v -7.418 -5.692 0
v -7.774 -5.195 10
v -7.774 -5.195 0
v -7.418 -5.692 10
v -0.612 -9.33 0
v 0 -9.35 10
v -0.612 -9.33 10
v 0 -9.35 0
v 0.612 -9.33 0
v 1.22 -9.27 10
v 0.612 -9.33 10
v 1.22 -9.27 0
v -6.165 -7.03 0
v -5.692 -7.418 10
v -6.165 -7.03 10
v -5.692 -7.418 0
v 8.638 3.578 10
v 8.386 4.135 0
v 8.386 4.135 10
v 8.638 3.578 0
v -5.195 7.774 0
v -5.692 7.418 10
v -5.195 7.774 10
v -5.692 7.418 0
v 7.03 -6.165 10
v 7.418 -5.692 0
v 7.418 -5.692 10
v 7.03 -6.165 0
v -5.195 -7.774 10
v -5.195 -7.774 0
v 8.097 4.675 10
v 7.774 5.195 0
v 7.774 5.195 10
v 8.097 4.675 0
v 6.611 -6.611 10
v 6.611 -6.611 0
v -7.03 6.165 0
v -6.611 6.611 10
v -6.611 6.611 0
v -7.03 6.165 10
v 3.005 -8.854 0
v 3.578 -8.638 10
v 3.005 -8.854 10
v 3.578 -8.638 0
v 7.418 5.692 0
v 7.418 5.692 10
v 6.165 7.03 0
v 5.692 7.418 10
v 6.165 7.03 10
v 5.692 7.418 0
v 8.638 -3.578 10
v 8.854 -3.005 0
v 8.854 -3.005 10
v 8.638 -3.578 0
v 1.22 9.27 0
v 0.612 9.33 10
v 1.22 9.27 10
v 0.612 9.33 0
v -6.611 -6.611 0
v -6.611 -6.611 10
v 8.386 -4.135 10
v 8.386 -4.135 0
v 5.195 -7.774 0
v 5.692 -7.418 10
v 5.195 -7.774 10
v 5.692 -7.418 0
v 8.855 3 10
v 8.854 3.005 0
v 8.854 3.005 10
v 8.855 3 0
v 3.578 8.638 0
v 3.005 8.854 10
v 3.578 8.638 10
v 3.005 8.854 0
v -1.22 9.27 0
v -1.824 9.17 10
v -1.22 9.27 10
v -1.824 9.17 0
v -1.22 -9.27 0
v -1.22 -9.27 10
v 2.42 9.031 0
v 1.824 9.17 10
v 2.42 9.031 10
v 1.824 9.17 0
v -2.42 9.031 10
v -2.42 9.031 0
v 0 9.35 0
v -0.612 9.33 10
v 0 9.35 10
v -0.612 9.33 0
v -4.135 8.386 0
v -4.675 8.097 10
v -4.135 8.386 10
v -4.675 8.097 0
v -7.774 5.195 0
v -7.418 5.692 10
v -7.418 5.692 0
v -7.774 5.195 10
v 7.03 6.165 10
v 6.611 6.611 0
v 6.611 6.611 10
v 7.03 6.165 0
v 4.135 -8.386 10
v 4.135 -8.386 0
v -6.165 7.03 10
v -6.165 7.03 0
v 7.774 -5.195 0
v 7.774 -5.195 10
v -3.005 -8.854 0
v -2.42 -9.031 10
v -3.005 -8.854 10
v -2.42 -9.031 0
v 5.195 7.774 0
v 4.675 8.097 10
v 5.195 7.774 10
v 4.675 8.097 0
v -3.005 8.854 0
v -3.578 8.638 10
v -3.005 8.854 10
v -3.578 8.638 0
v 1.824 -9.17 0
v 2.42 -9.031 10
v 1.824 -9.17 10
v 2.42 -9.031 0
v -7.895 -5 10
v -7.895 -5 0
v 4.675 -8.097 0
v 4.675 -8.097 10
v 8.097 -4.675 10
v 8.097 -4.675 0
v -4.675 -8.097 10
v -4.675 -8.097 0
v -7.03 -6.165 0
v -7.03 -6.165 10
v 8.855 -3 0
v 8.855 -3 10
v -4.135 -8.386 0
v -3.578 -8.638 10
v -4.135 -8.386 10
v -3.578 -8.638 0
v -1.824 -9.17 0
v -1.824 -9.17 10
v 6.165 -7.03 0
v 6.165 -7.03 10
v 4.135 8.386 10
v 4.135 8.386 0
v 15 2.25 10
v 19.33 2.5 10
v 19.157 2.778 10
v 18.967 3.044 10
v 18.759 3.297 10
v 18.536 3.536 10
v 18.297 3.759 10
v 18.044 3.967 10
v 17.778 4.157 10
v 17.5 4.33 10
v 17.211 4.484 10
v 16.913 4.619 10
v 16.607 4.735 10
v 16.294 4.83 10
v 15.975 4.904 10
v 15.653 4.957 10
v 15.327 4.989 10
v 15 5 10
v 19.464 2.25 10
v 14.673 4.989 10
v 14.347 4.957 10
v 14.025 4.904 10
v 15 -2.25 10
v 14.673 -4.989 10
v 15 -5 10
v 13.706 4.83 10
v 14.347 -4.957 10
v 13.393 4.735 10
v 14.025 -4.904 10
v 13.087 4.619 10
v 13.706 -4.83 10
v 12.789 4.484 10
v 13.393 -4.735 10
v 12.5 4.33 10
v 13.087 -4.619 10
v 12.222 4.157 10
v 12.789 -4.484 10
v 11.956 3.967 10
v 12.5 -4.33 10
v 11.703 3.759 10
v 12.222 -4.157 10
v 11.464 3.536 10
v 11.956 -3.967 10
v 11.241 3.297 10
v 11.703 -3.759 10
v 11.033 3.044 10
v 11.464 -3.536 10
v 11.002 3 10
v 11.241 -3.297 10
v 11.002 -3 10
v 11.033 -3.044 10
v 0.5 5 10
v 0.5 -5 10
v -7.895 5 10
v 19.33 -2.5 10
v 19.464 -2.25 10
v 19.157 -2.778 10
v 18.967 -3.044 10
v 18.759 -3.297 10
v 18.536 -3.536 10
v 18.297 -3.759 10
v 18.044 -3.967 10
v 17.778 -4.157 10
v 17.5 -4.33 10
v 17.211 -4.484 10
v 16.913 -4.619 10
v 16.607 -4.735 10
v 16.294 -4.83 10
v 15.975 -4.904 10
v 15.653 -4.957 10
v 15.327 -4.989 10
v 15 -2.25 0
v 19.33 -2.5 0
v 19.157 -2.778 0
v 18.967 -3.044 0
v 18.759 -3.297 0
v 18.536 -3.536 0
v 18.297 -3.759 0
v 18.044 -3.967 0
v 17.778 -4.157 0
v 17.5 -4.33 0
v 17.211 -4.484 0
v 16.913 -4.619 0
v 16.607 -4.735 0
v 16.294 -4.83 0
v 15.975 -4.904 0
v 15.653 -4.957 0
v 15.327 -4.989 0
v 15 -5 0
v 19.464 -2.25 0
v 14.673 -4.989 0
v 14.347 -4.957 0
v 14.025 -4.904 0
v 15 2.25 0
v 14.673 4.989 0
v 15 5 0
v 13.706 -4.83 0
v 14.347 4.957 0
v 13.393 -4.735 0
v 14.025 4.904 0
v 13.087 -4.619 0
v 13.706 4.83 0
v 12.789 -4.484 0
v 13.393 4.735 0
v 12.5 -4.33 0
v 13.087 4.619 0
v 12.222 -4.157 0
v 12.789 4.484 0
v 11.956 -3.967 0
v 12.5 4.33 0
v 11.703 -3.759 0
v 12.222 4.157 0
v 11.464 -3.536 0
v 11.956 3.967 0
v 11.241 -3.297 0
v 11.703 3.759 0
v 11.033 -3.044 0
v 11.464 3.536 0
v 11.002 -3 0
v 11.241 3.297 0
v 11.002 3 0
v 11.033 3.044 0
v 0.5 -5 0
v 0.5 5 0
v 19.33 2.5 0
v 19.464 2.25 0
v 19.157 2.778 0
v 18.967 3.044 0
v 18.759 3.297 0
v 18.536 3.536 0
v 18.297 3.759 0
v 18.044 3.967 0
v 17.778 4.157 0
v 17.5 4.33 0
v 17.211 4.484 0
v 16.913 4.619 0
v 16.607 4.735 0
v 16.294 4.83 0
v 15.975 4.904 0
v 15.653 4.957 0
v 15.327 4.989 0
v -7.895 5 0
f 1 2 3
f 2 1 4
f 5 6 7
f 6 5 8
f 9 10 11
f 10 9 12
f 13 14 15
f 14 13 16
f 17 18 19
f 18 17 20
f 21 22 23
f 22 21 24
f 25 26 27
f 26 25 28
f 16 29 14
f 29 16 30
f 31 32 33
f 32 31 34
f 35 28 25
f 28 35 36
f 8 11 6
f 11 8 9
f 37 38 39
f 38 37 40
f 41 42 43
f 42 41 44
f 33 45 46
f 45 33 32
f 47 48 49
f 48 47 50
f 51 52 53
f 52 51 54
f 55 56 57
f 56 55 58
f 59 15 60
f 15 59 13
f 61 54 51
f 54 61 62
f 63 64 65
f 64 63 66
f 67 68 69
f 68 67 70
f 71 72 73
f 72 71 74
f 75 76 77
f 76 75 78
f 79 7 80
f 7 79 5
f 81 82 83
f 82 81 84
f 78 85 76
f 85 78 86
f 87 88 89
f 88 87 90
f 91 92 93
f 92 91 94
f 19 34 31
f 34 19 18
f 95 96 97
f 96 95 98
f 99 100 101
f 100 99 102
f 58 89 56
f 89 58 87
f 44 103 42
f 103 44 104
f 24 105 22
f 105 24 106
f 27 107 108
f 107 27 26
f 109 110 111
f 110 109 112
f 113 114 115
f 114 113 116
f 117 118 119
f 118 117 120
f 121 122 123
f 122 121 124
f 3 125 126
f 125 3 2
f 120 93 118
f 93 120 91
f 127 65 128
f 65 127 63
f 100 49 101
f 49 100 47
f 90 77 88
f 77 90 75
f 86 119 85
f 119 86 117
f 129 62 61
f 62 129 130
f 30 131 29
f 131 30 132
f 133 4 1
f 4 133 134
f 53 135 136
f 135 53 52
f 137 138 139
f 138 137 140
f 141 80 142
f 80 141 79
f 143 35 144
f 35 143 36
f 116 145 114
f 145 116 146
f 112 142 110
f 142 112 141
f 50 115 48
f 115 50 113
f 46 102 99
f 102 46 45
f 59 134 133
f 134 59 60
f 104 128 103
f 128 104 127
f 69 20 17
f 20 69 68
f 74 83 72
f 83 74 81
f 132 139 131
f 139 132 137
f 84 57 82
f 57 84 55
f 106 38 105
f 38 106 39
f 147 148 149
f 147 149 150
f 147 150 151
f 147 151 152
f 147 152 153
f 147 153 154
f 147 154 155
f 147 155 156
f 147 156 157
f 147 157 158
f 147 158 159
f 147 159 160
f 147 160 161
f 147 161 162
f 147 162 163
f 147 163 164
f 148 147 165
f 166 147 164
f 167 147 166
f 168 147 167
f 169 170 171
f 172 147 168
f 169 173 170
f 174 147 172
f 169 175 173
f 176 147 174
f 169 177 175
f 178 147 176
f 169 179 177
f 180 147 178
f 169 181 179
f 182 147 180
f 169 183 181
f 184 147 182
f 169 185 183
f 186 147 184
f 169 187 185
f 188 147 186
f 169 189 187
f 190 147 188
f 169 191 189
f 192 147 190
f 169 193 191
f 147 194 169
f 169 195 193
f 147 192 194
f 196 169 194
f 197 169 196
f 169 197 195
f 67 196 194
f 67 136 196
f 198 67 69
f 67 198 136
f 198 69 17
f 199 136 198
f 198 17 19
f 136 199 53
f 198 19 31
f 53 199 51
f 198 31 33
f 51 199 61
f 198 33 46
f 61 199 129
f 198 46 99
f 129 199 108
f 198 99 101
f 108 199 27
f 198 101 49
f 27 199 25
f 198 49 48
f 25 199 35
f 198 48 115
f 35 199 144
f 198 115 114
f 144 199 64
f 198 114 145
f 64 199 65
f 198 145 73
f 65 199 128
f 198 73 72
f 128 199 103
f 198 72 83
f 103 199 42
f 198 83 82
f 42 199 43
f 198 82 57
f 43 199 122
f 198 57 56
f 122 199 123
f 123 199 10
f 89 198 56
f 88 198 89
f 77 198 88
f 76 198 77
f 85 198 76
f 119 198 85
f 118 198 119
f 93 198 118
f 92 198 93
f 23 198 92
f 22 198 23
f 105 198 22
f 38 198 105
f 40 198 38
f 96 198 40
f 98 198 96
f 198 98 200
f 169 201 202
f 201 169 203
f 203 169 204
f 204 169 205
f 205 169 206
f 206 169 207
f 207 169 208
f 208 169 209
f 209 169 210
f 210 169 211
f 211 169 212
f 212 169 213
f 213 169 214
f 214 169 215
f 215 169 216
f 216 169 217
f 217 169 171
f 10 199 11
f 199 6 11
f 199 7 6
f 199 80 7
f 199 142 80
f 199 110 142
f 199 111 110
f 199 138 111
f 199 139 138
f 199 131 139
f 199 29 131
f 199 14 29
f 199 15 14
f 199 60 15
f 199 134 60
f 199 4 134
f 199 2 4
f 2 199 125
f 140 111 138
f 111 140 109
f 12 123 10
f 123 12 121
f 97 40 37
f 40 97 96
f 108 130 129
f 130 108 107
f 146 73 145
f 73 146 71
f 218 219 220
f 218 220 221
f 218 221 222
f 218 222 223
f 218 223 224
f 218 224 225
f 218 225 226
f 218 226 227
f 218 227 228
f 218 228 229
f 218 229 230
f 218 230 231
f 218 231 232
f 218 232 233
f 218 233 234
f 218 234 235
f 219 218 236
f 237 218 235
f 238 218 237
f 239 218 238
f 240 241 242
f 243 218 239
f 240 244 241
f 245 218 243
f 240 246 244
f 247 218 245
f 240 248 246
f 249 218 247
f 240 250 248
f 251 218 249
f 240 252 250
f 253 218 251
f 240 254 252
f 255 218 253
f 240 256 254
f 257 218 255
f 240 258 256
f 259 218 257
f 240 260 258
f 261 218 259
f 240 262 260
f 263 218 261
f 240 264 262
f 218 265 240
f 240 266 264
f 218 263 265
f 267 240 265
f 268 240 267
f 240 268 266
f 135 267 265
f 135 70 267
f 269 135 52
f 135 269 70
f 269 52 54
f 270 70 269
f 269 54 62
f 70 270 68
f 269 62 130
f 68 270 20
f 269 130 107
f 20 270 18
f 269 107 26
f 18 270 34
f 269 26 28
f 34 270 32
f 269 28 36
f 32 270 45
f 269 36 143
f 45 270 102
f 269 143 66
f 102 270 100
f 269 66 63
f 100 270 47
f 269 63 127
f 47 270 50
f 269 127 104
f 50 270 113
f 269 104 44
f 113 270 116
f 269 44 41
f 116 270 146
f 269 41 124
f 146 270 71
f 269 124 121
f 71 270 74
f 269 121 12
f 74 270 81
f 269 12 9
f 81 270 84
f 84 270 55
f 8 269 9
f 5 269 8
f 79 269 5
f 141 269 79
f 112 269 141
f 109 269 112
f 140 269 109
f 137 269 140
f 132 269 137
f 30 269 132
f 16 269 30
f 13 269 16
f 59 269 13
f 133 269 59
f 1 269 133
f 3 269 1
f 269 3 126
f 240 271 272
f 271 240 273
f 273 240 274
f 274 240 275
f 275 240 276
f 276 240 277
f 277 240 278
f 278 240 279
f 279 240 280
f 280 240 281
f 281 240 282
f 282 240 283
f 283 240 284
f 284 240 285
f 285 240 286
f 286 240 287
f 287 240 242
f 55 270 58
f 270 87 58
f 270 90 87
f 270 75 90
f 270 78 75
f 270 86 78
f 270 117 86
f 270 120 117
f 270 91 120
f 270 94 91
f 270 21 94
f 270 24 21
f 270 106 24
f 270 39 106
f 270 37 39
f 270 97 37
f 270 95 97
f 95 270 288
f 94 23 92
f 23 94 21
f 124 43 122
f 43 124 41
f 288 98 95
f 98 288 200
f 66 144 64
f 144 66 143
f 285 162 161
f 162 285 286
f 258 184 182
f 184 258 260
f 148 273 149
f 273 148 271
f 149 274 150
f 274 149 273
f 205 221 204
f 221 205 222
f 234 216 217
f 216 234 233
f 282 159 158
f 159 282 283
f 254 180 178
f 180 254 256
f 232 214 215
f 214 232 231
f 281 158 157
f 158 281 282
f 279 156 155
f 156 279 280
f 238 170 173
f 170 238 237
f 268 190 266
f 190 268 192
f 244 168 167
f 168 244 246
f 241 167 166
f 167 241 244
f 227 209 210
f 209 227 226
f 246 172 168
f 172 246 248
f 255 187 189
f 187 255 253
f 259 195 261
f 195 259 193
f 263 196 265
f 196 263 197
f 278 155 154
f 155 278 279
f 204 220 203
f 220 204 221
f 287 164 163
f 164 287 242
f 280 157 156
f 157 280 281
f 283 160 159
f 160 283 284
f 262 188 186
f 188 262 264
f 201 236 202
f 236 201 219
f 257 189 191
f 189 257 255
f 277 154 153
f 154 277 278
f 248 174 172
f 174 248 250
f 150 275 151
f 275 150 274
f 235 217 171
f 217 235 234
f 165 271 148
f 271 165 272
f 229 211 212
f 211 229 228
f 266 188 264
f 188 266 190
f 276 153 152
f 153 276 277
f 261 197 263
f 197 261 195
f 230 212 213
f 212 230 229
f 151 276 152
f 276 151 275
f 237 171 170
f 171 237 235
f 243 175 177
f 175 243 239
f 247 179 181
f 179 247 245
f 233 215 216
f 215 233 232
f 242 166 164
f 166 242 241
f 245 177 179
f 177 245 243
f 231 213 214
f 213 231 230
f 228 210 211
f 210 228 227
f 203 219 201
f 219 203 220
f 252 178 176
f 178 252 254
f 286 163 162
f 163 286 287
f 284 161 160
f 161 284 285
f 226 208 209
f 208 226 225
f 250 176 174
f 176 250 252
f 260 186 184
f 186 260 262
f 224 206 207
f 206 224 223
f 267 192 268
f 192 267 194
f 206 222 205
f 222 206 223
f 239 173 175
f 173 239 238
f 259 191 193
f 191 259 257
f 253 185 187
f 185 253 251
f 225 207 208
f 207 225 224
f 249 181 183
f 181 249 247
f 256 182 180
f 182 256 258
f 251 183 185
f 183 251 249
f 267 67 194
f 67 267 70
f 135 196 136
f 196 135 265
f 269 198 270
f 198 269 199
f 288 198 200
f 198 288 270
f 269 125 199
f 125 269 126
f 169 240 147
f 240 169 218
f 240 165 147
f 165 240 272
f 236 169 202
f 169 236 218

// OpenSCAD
// Tubing clip for a 12.7 mm (1/2 inch) lab stand rod
// Print orientation: flat on the bed, extruded upward in +Z

// ---------------- Parameters ----------------
rod_d        = 12.7;   // stand rod diameter
ring_w       = 3;      // rod ring wall thickness
ring_od      = rod_d + 2 * ring_w;  // rod ring outer diameter (18.7 mm)
ring_id      = rod_d;  // rod ring inner diameter (12.7 mm)

tub_d        = 6;      // tubing ring inner diameter
tub_w        = 2;      // tubing ring wall thickness
tub_od       = tub_d + 2 * tub_w;   // tubing ring outer diameter (10 mm)
tub_x        = 15;     // tubing ring centre X position

bridge_x0    = 8;      // bridge start (X)
bridge_x1    = 12;     // bridge end (X)
bridge_w     = 6;      // bridge width (Y)

opening_rod  = 10;     // rod ring opening width (Y), on -X side
opening_tub  = 4.5;    // tubing ring opening width (Y), on +X side

height       = 10;     // extrusion height (Z)

eps          = 0.5;    // cutter overshoot past faces

$fn = 96;

// ---------------- Model ----------------
difference() {
    union() {
        // Rod ring
        cylinder(d = ring_od, h = height);

        // Tubing ring
        translate([tub_x, 0, 0])
            cylinder(d = tub_od, h = height);

        // Solid bridge between the rings
        translate([bridge_x0, -bridge_w / 2, 0])
            cube([bridge_x1 - bridge_x0, bridge_w, height]);
    }

    // Rod ring opening: removes everything with x < 0 and -5 < y < 5
    translate([-ring_od - eps, -opening_rod / 2, -eps])
        cube([ring_od + 2 * eps, opening_rod, height + 2 * eps]);

    // Tubing ring opening: removes x > 15 and -2.25 < y < 2.25
    translate([tub_x, -opening_tub / 2, -eps])
        cube([ring_od + 2 * eps, opening_tub, height + 2 * eps]);
}
